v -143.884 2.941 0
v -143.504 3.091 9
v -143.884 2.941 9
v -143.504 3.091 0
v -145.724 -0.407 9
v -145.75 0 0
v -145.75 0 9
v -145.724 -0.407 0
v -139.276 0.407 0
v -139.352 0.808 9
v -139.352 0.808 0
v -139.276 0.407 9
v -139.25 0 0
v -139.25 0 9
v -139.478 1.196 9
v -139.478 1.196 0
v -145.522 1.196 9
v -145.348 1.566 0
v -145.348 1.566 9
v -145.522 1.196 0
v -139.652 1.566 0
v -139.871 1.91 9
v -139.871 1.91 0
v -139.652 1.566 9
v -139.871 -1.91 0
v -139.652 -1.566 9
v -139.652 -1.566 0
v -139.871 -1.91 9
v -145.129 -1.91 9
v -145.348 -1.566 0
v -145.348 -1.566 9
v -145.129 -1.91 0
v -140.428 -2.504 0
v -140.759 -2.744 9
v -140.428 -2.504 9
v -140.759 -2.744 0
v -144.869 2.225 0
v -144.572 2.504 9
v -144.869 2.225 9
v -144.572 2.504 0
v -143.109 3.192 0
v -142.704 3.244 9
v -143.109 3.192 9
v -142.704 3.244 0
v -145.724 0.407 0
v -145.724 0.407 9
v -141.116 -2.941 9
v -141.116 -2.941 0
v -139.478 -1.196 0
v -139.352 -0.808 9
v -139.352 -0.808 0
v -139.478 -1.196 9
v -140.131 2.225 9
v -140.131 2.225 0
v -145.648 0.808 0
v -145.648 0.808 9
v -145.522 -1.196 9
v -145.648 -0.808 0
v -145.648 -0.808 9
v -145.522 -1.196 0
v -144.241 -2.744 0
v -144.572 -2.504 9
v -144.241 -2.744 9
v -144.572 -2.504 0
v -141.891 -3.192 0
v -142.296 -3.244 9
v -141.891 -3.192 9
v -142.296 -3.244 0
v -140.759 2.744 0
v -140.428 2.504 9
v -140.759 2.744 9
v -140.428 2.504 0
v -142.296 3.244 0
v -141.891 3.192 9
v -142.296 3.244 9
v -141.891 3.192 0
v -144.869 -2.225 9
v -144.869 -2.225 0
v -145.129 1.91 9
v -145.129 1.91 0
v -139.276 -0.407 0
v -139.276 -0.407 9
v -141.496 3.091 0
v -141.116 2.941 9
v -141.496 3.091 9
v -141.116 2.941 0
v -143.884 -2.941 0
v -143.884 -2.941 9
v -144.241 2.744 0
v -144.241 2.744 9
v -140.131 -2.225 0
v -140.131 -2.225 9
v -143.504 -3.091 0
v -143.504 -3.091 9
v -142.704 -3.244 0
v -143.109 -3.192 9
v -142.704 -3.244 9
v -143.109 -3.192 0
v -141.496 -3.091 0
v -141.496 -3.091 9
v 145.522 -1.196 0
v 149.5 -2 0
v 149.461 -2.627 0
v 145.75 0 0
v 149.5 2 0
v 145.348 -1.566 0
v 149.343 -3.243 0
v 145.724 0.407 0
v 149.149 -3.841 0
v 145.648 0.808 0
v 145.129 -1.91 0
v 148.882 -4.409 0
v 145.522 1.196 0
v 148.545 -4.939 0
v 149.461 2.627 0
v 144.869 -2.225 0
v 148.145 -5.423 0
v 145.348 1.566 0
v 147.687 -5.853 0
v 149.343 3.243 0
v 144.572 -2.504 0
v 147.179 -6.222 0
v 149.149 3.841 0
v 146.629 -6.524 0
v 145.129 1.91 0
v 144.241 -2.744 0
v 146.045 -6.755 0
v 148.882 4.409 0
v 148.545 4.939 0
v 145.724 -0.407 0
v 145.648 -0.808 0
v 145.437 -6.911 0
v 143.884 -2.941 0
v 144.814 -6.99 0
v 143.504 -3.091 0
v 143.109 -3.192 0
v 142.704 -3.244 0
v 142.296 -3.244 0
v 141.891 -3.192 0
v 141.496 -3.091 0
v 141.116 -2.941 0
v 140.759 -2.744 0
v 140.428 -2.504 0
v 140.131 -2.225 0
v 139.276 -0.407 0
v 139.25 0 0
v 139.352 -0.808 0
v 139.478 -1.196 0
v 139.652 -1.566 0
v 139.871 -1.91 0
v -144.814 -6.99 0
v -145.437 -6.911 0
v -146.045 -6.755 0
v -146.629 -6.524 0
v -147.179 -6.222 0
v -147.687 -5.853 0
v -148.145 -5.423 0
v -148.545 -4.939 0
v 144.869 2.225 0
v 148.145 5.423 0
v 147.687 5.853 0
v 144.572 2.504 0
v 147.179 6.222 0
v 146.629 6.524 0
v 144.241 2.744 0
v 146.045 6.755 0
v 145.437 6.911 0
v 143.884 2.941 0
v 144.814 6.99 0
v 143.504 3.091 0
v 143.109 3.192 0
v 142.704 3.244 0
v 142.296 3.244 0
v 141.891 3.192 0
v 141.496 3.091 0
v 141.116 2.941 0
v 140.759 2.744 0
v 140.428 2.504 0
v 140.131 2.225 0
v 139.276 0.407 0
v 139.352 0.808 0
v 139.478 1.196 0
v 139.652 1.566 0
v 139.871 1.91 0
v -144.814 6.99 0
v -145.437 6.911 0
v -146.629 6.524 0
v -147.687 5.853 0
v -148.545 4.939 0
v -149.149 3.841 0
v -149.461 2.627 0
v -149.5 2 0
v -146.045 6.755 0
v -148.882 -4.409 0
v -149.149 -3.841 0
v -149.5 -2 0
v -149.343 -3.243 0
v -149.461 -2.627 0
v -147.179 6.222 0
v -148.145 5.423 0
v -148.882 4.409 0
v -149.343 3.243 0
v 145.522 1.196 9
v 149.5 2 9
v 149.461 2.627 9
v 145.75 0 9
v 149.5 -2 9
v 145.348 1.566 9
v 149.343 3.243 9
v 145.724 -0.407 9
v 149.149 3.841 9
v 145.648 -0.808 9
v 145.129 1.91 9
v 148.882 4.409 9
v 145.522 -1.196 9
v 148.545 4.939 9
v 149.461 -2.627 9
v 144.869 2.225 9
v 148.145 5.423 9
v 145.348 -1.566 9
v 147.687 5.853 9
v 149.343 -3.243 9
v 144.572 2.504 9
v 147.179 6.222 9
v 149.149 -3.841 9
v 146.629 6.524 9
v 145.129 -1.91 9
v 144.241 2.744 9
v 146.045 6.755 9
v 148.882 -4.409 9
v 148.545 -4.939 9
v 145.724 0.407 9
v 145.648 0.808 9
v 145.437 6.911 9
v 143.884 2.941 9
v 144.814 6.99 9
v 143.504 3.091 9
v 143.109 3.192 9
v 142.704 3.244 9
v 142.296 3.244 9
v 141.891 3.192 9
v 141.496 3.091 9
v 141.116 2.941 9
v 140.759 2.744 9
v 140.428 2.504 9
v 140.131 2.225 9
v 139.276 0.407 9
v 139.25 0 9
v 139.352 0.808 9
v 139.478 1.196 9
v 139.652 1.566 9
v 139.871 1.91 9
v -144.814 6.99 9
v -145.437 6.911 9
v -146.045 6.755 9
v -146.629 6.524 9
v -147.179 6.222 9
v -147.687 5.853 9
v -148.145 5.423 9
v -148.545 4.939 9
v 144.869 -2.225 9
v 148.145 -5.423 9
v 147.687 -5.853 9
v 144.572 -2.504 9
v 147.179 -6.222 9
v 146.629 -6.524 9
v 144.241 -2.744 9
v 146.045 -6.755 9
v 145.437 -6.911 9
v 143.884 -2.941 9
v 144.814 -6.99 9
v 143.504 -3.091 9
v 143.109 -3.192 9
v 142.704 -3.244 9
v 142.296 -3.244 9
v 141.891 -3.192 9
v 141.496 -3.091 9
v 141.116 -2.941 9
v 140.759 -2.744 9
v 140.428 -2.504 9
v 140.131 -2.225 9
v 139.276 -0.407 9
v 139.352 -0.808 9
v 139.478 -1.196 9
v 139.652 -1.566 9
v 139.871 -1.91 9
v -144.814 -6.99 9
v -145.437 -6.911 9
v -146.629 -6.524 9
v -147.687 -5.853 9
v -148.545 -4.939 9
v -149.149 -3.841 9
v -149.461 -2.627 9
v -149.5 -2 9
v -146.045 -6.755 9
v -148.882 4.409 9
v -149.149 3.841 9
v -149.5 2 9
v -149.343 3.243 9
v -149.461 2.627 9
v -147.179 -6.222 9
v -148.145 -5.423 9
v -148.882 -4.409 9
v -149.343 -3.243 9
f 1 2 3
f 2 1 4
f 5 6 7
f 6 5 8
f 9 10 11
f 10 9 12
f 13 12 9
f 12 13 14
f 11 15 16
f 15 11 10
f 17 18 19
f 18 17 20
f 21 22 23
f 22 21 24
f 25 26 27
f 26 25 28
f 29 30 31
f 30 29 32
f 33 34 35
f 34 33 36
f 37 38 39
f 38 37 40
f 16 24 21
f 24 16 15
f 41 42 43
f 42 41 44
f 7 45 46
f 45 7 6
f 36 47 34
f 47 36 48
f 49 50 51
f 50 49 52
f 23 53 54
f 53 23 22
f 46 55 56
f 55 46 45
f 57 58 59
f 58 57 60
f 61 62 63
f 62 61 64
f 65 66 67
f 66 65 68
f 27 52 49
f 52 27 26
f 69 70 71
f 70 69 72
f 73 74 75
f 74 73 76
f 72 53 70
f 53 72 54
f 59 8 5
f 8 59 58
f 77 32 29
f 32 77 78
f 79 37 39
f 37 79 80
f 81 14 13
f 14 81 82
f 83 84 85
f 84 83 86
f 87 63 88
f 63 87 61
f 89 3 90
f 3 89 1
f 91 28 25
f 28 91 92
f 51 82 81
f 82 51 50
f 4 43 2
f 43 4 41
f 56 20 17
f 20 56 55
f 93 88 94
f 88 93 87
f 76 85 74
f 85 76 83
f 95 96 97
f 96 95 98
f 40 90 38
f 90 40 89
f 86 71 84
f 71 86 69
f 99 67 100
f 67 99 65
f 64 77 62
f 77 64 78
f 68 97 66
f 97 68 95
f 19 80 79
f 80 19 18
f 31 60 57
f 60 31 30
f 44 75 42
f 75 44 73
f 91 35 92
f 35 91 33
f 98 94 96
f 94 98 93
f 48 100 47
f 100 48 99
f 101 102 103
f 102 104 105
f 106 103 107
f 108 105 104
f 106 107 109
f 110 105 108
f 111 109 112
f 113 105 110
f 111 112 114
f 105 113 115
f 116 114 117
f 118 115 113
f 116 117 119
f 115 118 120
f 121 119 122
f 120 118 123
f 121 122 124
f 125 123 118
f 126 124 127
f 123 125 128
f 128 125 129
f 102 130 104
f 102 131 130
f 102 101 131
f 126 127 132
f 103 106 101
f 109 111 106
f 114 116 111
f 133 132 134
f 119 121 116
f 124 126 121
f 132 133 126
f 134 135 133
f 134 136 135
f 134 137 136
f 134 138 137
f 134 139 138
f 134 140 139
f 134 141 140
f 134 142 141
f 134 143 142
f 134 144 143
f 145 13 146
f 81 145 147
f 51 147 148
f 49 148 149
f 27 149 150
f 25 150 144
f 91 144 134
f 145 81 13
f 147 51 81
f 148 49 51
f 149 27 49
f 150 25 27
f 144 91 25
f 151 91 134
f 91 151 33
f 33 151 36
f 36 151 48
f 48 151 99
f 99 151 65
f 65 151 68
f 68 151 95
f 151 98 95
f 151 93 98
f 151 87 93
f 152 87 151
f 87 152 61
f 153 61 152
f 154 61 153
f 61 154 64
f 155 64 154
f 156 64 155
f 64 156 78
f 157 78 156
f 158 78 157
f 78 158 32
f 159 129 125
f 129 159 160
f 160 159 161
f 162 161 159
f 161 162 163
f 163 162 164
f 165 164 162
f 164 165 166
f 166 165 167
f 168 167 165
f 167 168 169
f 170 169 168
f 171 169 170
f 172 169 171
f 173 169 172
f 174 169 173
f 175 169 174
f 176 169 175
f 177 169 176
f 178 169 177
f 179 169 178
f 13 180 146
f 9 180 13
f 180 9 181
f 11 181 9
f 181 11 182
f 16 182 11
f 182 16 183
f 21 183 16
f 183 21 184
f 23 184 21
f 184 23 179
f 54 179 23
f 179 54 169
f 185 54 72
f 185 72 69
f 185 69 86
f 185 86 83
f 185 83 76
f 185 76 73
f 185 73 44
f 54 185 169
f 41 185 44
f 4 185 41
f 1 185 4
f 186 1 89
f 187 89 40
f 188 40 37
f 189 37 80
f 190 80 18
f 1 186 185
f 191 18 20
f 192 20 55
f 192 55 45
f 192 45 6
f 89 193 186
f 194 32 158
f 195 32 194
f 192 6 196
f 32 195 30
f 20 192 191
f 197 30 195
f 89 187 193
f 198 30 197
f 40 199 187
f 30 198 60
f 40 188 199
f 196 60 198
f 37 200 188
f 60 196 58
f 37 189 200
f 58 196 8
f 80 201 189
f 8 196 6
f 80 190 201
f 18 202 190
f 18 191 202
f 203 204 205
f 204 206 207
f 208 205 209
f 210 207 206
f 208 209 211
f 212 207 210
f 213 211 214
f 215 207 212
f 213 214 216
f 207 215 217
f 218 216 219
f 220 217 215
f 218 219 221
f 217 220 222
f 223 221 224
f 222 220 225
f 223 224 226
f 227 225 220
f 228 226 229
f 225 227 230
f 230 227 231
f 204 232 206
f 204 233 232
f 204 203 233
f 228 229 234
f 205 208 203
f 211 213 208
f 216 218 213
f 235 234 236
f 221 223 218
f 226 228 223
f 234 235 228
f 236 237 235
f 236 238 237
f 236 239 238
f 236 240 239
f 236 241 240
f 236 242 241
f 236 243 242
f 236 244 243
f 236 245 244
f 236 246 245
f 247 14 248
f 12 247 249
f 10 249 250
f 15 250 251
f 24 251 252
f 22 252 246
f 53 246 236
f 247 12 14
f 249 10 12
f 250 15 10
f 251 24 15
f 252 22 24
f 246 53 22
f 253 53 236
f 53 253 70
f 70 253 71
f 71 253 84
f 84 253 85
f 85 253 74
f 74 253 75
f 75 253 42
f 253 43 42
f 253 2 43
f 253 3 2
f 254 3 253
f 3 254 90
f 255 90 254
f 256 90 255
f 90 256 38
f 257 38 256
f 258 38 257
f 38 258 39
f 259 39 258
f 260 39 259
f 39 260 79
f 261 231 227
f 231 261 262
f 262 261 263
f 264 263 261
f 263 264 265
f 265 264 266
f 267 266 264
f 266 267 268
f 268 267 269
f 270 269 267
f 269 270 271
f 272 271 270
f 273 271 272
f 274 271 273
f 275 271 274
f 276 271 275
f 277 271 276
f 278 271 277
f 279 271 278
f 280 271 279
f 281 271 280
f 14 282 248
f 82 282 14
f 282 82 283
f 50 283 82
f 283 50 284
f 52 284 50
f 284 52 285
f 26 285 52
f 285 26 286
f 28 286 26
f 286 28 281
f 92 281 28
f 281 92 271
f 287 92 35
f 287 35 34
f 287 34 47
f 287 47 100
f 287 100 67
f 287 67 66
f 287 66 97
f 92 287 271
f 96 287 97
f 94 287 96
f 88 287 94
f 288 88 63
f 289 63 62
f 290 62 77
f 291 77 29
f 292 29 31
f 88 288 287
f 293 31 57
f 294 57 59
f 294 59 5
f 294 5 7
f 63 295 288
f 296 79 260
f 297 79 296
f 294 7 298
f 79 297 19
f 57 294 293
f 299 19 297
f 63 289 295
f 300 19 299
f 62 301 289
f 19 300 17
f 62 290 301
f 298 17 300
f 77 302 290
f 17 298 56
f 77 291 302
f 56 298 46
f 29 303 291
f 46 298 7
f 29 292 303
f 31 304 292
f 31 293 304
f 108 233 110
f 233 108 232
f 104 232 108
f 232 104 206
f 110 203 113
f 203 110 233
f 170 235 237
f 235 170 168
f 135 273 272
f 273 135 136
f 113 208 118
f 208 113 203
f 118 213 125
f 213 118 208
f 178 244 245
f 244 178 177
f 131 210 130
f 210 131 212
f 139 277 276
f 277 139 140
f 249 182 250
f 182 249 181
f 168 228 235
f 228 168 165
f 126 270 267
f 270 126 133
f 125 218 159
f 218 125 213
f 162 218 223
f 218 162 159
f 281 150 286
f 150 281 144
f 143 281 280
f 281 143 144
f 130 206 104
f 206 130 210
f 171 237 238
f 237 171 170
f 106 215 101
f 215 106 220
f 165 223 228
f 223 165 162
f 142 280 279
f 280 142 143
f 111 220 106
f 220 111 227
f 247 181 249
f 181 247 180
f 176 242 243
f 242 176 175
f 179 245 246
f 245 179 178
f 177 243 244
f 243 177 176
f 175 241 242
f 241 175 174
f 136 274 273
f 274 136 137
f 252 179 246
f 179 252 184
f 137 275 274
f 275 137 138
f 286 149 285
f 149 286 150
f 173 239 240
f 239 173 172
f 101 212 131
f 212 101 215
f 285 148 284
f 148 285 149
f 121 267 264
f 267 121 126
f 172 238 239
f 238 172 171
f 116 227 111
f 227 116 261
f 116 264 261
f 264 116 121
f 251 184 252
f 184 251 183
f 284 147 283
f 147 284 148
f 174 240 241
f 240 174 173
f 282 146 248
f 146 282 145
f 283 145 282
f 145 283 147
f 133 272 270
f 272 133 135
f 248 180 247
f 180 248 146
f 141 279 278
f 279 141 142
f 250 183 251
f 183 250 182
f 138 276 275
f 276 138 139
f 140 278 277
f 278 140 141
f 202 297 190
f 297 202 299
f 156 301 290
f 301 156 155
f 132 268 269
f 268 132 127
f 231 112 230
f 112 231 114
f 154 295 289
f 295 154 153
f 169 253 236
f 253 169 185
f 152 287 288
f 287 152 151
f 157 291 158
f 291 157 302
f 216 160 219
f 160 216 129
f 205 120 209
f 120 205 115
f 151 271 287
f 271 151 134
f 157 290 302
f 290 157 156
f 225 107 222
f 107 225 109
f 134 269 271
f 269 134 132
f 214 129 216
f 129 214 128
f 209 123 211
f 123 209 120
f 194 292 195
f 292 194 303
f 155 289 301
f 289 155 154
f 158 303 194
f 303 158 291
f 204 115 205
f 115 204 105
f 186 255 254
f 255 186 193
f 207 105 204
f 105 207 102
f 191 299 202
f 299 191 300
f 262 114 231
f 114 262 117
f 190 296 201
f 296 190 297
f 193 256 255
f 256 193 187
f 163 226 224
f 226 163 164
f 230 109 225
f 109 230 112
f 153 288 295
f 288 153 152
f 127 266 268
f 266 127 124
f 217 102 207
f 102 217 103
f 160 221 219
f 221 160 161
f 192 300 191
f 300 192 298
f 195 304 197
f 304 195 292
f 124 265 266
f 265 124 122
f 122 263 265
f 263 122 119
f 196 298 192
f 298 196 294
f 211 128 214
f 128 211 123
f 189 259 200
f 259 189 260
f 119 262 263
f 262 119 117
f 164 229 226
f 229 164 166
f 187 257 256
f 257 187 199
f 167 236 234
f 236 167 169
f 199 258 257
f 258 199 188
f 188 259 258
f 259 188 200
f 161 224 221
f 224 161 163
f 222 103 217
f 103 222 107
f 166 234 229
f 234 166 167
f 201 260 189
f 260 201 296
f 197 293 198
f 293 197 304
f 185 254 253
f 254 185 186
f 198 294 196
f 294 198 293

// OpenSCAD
$fn = 50;


difference() {
	union() {
		hull() {
			translate(v = [-144.5000000000, 2.0000000000, 0]) {
				cylinder(h = 9, r = 5);
			}
			translate(v = [144.5000000000, 2.0000000000, 0]) {
				cylinder(h = 9, r = 5);
			}
			translate(v = [-144.5000000000, -2.0000000000, 0]) {
				cylinder(h = 9, r = 5);
			}
			translate(v = [144.5000000000, -2.0000000000, 0]) {
				cylinder(h = 9, r = 5);
			}
		}
	}
	union() {
		translate(v = [-142.5000000000, 0.0000000000, 0]) {
			cylinder(h = 9, r = 3.2500000000);
		}
		translate(v = [142.5000000000, 0.0000000000, 0]) {
			cylinder(h = 9, r = 3.2500000000);
		}
		translate(v = [-142.5000000000, 0.0000000000, 0]) {
			cylinder(h = 9, r = 1.8000000000);
		}
		translate(v = [142.5000000000, 0.0000000000, 0]) {
			cylinder(h = 9, r = 1.8000000000);
		}
		translate(v = [-142.5000000000, 0.0000000000, 0]) {
			cylinder(h = 9, r = 1.8000000000);
		}
		translate(v = [142.5000000000, 0.0000000000, 0]) {
			cylinder(h = 9, r = 1.8000000000);
		}
		translate(v = [-142.5000000000, 0.0000000000, 0]) {
			cylinder(h = 9, r = 1.8000000000);
		}
		translate(v = [142.5000000000, 0.0000000000, 0]) {
			cylinder(h = 9, r = 1.8000000000);
		}
	}
}
